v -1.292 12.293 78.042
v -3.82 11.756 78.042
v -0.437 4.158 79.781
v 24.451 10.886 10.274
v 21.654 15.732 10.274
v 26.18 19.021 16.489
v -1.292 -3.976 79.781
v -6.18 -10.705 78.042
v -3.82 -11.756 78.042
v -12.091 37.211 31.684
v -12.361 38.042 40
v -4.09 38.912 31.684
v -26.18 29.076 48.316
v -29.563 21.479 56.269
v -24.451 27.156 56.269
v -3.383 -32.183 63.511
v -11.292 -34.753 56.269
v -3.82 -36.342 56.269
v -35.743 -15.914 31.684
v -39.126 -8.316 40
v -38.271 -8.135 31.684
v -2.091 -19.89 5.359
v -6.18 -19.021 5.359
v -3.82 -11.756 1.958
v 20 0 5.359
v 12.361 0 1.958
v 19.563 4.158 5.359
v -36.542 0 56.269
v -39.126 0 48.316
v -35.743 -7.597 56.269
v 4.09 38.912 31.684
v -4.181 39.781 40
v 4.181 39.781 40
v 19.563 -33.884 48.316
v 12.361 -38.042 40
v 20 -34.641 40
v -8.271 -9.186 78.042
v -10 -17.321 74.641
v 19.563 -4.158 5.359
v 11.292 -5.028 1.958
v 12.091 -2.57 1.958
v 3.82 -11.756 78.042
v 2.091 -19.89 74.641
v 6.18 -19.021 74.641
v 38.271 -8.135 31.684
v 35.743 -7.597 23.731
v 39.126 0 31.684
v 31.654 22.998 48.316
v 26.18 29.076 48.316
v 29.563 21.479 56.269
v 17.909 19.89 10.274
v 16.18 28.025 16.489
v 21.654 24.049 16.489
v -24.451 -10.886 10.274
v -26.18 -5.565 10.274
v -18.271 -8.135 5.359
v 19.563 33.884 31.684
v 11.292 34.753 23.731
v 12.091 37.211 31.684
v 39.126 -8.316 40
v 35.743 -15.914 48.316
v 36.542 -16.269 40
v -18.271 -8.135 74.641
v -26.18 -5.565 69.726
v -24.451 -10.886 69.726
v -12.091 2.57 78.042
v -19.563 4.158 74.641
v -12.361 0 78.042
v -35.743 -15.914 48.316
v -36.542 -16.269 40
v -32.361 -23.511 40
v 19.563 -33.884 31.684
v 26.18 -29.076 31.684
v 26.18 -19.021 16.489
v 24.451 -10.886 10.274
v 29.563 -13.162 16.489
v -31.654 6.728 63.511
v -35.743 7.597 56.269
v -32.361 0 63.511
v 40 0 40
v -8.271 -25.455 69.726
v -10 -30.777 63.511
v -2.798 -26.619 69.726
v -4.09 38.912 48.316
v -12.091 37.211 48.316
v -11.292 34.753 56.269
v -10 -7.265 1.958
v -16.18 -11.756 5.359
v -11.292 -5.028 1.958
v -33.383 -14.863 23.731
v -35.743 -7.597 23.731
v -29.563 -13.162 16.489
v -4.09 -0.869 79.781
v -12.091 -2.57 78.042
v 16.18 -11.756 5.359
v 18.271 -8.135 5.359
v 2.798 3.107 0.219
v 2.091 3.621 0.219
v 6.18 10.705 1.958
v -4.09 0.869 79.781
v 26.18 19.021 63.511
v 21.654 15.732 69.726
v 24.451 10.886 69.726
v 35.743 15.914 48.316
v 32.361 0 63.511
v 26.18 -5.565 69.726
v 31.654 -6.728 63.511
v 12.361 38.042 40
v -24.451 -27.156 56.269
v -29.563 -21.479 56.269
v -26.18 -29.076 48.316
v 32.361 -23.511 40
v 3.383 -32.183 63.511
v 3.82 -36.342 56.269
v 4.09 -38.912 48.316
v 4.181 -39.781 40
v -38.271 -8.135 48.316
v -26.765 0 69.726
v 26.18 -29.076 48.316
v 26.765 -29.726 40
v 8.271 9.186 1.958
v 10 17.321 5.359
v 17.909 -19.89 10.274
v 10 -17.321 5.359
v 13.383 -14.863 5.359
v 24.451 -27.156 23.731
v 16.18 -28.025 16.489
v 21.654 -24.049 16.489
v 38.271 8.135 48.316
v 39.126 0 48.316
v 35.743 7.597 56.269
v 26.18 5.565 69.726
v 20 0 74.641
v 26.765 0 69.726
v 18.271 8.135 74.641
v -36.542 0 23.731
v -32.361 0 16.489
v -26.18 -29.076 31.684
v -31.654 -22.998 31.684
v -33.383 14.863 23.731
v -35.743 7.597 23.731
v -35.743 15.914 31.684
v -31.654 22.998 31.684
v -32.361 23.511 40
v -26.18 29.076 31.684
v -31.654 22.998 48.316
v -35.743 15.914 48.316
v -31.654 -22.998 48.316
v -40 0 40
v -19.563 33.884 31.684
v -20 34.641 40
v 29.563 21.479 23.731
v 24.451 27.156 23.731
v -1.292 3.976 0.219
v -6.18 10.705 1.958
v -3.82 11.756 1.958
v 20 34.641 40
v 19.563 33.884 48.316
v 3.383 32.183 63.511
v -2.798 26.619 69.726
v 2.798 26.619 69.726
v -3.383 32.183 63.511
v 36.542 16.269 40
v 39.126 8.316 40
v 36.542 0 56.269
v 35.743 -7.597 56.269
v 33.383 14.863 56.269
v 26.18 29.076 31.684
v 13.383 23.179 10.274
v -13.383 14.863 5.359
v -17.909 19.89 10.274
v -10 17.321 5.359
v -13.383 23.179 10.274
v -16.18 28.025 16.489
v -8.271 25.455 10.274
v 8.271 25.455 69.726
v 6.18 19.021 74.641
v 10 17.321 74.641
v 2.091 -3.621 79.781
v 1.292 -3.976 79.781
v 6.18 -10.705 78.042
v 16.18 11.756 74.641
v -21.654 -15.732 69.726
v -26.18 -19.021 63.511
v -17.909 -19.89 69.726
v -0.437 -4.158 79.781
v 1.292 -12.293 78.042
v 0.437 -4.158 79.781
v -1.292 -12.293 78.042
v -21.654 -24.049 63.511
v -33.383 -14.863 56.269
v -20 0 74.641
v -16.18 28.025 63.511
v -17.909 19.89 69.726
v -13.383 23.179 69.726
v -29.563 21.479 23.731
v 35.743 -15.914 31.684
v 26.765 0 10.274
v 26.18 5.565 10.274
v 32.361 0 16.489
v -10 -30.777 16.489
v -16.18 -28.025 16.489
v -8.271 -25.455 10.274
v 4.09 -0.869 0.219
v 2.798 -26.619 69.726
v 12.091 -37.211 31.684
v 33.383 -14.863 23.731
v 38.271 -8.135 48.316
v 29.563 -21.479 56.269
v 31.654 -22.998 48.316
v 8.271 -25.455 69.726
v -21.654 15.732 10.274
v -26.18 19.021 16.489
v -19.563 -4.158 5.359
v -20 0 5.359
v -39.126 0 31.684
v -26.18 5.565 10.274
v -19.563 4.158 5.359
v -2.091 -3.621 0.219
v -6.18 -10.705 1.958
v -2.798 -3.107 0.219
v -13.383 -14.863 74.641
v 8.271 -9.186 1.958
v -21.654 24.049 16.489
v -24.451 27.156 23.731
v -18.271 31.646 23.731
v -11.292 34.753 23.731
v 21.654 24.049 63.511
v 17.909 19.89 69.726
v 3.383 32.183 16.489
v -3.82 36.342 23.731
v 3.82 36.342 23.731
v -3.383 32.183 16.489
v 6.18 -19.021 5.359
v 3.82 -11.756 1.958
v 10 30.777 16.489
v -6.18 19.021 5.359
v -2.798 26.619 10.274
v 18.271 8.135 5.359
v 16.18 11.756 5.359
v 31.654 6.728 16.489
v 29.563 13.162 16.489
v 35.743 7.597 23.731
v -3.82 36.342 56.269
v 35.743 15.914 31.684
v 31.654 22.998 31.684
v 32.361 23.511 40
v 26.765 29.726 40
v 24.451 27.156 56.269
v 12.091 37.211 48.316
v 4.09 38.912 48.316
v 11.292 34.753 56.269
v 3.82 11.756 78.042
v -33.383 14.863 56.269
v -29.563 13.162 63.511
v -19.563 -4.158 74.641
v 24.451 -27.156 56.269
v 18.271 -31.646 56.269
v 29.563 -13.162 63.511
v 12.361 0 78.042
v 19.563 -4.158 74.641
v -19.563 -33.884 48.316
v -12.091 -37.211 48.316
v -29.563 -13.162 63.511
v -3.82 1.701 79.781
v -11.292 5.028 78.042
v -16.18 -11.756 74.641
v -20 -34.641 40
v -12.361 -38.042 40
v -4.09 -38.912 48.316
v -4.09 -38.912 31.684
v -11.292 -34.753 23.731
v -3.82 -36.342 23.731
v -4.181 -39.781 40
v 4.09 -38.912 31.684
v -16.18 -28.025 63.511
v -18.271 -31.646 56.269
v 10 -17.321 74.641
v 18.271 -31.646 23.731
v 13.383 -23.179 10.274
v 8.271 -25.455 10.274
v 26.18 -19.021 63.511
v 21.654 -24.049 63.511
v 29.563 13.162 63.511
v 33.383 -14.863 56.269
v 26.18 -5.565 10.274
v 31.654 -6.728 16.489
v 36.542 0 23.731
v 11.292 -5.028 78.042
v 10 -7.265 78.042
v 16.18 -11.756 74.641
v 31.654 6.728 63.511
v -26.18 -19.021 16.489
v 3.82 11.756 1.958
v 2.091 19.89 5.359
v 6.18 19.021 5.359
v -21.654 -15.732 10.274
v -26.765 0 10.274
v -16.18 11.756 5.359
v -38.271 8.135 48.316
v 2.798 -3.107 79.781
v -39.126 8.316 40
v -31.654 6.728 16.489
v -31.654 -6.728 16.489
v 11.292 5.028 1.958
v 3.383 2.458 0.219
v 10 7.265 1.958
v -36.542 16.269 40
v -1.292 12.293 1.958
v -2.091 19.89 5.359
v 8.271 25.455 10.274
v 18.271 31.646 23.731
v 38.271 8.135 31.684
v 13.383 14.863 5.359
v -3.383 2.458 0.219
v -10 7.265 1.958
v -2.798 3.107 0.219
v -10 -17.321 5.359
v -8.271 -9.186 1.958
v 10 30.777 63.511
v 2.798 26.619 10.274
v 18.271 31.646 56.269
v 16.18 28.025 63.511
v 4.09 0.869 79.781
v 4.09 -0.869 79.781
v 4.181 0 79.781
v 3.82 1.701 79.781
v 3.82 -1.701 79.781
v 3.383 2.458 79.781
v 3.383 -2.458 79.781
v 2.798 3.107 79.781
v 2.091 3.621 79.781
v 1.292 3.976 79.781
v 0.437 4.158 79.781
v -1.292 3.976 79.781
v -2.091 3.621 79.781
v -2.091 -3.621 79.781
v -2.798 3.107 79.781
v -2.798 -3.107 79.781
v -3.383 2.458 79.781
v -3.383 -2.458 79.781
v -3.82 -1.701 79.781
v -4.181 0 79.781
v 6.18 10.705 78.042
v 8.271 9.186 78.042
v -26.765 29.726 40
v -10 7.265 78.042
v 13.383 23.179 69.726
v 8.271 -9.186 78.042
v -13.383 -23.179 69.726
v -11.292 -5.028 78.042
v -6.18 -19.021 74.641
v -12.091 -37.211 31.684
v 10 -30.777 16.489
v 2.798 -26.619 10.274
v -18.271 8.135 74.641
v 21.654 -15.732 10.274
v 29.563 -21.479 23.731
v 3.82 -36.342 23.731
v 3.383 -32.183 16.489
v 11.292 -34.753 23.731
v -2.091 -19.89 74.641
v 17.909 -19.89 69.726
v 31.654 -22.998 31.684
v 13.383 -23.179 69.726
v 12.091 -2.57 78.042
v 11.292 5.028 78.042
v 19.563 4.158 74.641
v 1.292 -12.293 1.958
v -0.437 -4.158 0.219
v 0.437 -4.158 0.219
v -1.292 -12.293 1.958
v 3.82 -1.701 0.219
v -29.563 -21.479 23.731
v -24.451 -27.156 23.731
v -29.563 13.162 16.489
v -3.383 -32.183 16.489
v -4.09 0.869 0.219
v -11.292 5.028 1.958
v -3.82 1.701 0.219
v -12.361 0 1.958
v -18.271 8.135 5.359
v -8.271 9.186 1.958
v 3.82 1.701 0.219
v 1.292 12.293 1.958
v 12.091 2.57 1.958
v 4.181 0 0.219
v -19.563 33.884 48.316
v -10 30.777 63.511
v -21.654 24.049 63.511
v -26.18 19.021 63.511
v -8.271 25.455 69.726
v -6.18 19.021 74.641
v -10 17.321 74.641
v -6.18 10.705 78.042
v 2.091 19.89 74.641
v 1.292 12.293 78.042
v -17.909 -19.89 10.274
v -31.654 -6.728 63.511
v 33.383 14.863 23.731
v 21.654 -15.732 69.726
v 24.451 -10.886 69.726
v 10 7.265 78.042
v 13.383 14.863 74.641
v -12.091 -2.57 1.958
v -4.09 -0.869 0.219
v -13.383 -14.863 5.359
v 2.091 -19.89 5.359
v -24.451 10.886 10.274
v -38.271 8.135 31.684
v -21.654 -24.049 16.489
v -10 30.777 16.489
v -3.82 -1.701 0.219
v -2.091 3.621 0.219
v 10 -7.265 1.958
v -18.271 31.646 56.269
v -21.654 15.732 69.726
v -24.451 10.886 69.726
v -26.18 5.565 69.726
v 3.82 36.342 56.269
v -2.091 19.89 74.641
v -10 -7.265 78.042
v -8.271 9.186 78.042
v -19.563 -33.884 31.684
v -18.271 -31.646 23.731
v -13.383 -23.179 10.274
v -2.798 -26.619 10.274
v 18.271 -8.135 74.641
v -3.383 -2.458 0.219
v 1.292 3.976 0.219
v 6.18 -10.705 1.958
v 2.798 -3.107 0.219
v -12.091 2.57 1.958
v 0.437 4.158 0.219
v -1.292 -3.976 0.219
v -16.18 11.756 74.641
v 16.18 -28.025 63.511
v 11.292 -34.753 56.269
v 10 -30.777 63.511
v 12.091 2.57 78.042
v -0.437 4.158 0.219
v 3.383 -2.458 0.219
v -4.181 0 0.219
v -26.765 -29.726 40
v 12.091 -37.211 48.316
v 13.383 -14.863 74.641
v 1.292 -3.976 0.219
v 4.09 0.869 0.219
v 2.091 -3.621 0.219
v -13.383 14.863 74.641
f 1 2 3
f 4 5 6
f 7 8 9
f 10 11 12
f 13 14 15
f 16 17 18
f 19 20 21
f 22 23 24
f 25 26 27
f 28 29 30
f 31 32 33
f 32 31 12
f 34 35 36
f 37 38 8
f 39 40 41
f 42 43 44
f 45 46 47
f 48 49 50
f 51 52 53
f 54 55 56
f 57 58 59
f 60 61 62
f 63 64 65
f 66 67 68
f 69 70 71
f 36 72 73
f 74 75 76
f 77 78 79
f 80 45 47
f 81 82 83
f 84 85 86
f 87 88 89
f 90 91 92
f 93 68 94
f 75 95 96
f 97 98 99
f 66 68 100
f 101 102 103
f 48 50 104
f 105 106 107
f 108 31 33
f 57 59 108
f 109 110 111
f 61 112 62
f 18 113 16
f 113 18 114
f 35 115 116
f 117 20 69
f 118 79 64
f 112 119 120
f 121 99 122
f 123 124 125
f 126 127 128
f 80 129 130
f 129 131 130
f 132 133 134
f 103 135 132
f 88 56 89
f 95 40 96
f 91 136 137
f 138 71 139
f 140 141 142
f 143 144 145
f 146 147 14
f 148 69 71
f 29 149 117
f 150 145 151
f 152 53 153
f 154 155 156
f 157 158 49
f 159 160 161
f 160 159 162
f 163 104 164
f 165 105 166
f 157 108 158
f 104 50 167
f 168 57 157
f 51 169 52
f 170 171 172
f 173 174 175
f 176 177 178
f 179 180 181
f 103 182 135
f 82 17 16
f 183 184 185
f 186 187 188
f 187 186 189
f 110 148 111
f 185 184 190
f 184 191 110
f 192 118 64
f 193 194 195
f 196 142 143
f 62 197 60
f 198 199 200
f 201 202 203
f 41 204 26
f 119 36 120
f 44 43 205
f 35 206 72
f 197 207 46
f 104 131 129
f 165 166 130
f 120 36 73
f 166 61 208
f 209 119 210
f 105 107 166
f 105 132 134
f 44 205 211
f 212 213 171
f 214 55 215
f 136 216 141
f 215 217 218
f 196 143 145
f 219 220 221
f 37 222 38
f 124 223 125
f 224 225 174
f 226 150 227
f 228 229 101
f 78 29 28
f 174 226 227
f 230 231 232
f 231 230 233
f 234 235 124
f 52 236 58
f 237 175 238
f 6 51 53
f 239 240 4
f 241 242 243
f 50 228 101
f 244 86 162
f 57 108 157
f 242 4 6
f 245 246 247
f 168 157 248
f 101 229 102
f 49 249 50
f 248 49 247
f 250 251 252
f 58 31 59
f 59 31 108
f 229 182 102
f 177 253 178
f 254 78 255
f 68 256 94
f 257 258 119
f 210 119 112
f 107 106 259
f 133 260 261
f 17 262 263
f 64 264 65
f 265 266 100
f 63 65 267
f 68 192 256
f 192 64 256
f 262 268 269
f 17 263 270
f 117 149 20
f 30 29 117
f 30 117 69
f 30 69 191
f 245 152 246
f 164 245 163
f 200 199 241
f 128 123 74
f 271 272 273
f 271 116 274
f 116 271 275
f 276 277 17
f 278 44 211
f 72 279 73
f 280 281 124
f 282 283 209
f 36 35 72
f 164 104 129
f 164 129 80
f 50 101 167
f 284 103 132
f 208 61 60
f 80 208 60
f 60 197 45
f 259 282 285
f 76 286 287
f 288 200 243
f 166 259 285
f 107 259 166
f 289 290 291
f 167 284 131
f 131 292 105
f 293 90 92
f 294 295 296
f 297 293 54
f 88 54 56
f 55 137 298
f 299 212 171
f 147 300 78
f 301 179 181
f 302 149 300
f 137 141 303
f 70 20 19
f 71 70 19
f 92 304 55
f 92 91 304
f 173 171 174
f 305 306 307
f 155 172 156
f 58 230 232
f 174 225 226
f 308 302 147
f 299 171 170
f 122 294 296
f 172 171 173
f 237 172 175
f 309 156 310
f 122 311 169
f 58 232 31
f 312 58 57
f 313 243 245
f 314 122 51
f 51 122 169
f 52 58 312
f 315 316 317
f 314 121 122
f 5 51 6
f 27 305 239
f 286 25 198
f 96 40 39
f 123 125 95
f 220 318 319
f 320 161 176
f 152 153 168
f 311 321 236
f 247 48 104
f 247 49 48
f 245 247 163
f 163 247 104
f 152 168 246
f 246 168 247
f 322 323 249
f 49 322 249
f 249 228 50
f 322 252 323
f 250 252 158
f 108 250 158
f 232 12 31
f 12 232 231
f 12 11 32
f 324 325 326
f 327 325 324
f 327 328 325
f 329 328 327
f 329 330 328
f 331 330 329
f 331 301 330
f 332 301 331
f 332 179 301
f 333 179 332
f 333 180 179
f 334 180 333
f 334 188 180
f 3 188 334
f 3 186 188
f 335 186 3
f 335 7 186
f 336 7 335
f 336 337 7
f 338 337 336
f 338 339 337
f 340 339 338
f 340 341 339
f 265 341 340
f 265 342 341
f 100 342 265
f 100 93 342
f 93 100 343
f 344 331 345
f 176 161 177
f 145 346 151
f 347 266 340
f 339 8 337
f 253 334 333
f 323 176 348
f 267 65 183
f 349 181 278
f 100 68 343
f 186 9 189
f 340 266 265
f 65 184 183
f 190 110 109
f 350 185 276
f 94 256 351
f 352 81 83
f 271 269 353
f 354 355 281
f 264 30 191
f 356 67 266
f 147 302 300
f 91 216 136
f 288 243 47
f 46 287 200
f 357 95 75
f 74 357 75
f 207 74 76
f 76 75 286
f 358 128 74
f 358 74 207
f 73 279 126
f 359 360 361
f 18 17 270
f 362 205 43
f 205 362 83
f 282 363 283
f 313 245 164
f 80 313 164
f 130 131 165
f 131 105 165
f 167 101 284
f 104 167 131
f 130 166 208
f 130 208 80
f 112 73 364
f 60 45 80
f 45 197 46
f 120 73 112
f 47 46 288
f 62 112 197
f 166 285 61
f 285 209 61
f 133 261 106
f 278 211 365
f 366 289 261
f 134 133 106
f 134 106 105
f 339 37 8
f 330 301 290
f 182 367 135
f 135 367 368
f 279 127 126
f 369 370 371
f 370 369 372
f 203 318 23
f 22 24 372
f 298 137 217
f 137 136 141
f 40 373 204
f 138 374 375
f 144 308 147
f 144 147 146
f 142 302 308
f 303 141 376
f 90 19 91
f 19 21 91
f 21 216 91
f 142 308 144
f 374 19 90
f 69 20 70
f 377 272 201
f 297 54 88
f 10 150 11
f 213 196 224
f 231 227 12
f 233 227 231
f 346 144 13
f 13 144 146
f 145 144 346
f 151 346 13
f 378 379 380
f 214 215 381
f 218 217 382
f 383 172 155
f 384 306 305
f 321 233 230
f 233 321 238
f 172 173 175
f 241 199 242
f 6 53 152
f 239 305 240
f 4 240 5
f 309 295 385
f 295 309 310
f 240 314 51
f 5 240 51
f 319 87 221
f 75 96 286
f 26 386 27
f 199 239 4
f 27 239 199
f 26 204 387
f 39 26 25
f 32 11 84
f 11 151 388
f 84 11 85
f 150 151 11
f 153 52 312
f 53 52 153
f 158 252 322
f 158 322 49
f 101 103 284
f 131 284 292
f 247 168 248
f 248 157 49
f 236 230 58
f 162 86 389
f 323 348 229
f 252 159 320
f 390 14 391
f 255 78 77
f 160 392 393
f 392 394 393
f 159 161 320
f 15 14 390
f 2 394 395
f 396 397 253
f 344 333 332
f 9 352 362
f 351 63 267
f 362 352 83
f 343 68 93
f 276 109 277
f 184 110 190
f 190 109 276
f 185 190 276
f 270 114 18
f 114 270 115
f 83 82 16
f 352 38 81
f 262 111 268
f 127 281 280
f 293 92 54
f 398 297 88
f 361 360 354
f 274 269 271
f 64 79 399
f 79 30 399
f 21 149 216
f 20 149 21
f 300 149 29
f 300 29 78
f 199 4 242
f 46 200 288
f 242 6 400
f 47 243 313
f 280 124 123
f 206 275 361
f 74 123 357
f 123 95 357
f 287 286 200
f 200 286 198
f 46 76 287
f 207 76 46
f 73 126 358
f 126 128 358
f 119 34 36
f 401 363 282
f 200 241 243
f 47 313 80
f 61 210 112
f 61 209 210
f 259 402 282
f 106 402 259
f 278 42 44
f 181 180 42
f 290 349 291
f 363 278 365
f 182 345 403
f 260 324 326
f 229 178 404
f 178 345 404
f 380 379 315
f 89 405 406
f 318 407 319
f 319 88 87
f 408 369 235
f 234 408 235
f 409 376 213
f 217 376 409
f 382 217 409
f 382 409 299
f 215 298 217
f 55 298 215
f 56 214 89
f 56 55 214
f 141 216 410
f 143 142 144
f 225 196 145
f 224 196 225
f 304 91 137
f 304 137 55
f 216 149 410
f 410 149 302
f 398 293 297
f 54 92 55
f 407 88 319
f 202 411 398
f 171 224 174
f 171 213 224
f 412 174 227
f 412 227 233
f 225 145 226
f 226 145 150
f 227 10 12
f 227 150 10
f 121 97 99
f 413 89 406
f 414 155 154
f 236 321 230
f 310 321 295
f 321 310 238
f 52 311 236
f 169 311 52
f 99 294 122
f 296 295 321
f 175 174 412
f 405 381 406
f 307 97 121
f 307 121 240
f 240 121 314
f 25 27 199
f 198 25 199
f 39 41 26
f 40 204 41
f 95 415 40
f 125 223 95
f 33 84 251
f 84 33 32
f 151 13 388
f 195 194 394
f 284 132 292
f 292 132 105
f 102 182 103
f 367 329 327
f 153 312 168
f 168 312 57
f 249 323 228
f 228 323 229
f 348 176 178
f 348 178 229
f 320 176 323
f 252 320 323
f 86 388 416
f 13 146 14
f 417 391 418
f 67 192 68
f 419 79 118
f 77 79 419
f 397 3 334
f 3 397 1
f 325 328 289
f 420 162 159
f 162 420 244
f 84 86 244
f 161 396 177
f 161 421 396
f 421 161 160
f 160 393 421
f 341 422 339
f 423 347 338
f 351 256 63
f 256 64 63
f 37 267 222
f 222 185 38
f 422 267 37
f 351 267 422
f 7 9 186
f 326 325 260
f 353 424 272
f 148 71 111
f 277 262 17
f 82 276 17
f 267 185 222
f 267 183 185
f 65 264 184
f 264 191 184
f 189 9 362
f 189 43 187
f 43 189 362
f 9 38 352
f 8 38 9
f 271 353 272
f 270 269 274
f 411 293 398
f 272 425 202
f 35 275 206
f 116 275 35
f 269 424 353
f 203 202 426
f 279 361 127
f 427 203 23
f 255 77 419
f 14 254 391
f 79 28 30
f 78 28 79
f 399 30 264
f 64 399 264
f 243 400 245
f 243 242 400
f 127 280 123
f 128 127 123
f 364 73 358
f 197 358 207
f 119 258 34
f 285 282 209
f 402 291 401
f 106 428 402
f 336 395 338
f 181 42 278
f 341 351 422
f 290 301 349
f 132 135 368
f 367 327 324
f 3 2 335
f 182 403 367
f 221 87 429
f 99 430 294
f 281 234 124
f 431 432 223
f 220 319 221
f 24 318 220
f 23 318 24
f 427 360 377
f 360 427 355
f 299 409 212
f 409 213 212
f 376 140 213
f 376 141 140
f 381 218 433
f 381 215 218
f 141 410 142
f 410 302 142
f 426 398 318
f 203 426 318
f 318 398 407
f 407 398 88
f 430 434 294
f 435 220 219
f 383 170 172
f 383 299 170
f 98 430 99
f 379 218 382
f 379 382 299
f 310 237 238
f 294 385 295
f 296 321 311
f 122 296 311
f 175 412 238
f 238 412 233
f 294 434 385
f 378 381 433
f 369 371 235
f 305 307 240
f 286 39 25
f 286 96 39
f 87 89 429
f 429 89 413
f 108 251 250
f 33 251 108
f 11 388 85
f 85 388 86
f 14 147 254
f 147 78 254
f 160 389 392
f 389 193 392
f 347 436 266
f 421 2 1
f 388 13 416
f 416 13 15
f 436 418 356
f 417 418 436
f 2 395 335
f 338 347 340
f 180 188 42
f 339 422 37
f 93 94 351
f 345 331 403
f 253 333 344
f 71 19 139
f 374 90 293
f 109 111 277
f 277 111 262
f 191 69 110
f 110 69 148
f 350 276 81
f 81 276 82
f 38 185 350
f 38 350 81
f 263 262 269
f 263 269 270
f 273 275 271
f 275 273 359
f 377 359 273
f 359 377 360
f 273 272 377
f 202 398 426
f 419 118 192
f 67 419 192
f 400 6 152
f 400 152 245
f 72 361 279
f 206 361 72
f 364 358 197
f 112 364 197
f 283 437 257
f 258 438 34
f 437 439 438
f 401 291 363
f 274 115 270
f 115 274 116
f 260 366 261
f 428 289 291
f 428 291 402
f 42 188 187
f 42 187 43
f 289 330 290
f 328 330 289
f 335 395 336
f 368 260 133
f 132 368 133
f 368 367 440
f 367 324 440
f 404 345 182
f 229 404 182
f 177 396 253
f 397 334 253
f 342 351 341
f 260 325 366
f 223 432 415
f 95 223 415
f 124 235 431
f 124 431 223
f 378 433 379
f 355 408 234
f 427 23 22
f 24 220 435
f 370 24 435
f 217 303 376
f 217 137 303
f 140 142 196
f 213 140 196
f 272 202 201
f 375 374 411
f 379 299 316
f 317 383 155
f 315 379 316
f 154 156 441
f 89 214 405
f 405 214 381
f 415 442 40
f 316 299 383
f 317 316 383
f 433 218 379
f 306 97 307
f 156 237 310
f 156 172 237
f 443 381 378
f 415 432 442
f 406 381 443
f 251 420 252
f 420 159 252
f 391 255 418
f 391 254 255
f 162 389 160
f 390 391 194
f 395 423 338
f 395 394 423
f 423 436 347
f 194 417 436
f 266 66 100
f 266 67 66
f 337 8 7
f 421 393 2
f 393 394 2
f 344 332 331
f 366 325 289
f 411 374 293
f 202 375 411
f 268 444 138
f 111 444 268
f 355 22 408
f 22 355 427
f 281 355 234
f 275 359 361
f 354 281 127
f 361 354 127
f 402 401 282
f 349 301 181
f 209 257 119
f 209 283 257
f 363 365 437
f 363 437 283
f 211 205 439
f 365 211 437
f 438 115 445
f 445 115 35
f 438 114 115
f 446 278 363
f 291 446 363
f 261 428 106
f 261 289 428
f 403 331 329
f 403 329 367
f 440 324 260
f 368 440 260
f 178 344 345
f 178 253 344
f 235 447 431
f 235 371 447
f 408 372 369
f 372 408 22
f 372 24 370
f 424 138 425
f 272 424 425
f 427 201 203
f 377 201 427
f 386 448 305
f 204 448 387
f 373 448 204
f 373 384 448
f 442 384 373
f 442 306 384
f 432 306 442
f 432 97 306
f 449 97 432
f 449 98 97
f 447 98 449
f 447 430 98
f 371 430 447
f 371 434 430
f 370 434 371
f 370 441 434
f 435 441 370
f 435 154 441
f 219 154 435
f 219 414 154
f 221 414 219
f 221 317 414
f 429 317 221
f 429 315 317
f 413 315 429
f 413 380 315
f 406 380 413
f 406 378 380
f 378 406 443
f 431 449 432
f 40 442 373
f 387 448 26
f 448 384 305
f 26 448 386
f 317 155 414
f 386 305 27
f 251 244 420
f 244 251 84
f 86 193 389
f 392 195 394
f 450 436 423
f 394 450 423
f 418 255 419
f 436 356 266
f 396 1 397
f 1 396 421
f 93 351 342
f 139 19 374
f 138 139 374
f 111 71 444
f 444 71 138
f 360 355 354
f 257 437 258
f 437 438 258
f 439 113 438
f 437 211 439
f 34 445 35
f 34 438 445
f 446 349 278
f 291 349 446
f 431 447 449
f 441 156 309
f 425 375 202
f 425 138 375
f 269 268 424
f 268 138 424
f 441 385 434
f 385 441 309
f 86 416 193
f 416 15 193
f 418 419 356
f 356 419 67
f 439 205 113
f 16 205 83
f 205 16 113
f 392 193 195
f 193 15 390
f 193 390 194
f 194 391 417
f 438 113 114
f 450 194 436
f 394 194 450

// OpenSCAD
module custard(r = 40) {
    minkowski() {
        intersection() {
            linear_extrude(height = r + 0.5) import("splodge.dxf");
            sphere(r = r + 0.5);
        }
        sphere(r = 1);
    }
}

module pudding(r = 40, custard = true) {
    translate([0, 0, r]) {
        if (custard) {
            custard(r = r);
        }
        sphere(r = r);
    }
}

pudding();
